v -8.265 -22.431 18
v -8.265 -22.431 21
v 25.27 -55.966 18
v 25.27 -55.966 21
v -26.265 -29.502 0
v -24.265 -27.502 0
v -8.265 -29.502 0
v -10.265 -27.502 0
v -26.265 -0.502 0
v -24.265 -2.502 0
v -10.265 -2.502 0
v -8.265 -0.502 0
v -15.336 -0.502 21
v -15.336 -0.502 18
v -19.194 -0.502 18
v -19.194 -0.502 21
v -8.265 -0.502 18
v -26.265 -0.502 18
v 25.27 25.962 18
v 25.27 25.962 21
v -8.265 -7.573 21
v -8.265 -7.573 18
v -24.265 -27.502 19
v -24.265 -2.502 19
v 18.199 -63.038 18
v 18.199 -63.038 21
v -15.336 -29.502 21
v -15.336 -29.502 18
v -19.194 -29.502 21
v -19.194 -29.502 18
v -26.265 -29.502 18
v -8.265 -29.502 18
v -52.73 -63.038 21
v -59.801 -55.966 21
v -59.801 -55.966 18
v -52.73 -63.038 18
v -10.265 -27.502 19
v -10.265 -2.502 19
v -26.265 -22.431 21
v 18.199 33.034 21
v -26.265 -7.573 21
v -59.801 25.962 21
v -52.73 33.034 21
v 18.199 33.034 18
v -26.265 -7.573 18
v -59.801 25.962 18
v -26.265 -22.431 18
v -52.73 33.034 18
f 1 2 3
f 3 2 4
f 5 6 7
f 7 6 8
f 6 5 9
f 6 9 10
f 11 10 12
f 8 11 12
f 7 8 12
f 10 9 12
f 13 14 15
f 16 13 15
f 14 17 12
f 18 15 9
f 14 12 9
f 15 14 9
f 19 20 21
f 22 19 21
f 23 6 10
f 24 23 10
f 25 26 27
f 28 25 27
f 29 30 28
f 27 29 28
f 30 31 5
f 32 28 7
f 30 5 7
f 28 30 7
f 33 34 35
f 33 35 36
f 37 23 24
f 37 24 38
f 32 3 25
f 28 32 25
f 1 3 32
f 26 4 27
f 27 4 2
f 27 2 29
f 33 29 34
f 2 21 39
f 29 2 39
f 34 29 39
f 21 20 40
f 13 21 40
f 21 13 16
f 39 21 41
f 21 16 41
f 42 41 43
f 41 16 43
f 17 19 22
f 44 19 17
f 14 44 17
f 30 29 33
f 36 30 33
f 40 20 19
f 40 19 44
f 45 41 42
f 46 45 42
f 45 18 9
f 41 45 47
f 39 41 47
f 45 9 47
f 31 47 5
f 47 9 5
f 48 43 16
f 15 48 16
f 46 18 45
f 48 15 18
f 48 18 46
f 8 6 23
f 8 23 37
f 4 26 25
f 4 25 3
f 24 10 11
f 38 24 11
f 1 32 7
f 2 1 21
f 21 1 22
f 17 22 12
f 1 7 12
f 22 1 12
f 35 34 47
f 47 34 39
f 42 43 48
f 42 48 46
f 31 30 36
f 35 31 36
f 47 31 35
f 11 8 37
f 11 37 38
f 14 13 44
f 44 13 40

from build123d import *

# Parameters (mm, degrees)
CROQUIS1_W              = 14
CROQUIS1_H              = 25
SALIENTE_EXTRUIR3_DEPTH = 21
CROQUIS3_W              = 14
CROQUIS3_H              = 25
SALIENTE_EXTRUIR4_DEPTH = 2
SALIENTE_EXTRUIR5_DEPTH = 3


with BuildPart() as part:
    # Croquis1 → Saliente-Extruir3 (new body)
    with BuildSketch(Plane.XY):
        Polygon((-26.265270251, -2.501993068), (-26.265270251, -29.501993068), (-10.265270251, -29.501993068), (-8.265270251, -29.501993068), (-8.265270251, -27.501993068), (-8.265270251, -0.501993068), (-24.265270251, -0.501993068), (-26.265270251, -0.501993068), align=None)
        with Locations((-17.265270251, -15.001993068)):
            Rectangle(CROQUIS1_W, CROQUIS1_H, mode=Mode.SUBTRACT)
    extrude(amount=SALIENTE_EXTRUIR3_DEPTH)

    # Croquis3 → Saliente-Extruir4 (add)
    with BuildSketch(Plane.XY.offset(21)):
        with Locations((-17.265270251, -15.001993068)):
            Rectangle(CROQUIS3_W, CROQUIS3_H)
    extrude(amount=-SALIENTE_EXTRUIR4_DEPTH)

    # Croquis4 → Saliente-Extruir5 (add)
    with BuildSketch(Plane.XY.offset(21)):
        Polygon((-56.265270251, 29.498006932), (-52.729736345, 33.033540838), (-19.194202439, -0.501993068), (-26.265270251, -0.501993068), (-26.265270251, -7.573060879), (-59.800804157, 25.962473026), align=None)
        Polygon((21.734729749, 29.498006932), (25.270263655, 25.962473026), (-8.265270251, -7.573060879), (-8.265270251, -0.501993068), (-15.336338063, -0.501993068), (18.199195843, 33.033540838), align=None)
        Polygon((25.270263655, -55.966459162), (21.734729749, -59.501993068), (18.199195843, -63.037526974), (-15.336338063, -29.501993068), (-8.265270251, -29.501993068), (-8.265270251, -22.430925256), align=None)
        Polygon((-56.265270251, -59.501993068), (-59.800804157, -55.966459162), (-26.265270251, -22.430925256), (-26.265270251, -29.501993068), (-19.194202439, -29.501993068), (-52.729736345, -63.037526974), align=None)
    extrude(amount=-SALIENTE_EXTRUIR5_DEPTH)


solid = part.part
